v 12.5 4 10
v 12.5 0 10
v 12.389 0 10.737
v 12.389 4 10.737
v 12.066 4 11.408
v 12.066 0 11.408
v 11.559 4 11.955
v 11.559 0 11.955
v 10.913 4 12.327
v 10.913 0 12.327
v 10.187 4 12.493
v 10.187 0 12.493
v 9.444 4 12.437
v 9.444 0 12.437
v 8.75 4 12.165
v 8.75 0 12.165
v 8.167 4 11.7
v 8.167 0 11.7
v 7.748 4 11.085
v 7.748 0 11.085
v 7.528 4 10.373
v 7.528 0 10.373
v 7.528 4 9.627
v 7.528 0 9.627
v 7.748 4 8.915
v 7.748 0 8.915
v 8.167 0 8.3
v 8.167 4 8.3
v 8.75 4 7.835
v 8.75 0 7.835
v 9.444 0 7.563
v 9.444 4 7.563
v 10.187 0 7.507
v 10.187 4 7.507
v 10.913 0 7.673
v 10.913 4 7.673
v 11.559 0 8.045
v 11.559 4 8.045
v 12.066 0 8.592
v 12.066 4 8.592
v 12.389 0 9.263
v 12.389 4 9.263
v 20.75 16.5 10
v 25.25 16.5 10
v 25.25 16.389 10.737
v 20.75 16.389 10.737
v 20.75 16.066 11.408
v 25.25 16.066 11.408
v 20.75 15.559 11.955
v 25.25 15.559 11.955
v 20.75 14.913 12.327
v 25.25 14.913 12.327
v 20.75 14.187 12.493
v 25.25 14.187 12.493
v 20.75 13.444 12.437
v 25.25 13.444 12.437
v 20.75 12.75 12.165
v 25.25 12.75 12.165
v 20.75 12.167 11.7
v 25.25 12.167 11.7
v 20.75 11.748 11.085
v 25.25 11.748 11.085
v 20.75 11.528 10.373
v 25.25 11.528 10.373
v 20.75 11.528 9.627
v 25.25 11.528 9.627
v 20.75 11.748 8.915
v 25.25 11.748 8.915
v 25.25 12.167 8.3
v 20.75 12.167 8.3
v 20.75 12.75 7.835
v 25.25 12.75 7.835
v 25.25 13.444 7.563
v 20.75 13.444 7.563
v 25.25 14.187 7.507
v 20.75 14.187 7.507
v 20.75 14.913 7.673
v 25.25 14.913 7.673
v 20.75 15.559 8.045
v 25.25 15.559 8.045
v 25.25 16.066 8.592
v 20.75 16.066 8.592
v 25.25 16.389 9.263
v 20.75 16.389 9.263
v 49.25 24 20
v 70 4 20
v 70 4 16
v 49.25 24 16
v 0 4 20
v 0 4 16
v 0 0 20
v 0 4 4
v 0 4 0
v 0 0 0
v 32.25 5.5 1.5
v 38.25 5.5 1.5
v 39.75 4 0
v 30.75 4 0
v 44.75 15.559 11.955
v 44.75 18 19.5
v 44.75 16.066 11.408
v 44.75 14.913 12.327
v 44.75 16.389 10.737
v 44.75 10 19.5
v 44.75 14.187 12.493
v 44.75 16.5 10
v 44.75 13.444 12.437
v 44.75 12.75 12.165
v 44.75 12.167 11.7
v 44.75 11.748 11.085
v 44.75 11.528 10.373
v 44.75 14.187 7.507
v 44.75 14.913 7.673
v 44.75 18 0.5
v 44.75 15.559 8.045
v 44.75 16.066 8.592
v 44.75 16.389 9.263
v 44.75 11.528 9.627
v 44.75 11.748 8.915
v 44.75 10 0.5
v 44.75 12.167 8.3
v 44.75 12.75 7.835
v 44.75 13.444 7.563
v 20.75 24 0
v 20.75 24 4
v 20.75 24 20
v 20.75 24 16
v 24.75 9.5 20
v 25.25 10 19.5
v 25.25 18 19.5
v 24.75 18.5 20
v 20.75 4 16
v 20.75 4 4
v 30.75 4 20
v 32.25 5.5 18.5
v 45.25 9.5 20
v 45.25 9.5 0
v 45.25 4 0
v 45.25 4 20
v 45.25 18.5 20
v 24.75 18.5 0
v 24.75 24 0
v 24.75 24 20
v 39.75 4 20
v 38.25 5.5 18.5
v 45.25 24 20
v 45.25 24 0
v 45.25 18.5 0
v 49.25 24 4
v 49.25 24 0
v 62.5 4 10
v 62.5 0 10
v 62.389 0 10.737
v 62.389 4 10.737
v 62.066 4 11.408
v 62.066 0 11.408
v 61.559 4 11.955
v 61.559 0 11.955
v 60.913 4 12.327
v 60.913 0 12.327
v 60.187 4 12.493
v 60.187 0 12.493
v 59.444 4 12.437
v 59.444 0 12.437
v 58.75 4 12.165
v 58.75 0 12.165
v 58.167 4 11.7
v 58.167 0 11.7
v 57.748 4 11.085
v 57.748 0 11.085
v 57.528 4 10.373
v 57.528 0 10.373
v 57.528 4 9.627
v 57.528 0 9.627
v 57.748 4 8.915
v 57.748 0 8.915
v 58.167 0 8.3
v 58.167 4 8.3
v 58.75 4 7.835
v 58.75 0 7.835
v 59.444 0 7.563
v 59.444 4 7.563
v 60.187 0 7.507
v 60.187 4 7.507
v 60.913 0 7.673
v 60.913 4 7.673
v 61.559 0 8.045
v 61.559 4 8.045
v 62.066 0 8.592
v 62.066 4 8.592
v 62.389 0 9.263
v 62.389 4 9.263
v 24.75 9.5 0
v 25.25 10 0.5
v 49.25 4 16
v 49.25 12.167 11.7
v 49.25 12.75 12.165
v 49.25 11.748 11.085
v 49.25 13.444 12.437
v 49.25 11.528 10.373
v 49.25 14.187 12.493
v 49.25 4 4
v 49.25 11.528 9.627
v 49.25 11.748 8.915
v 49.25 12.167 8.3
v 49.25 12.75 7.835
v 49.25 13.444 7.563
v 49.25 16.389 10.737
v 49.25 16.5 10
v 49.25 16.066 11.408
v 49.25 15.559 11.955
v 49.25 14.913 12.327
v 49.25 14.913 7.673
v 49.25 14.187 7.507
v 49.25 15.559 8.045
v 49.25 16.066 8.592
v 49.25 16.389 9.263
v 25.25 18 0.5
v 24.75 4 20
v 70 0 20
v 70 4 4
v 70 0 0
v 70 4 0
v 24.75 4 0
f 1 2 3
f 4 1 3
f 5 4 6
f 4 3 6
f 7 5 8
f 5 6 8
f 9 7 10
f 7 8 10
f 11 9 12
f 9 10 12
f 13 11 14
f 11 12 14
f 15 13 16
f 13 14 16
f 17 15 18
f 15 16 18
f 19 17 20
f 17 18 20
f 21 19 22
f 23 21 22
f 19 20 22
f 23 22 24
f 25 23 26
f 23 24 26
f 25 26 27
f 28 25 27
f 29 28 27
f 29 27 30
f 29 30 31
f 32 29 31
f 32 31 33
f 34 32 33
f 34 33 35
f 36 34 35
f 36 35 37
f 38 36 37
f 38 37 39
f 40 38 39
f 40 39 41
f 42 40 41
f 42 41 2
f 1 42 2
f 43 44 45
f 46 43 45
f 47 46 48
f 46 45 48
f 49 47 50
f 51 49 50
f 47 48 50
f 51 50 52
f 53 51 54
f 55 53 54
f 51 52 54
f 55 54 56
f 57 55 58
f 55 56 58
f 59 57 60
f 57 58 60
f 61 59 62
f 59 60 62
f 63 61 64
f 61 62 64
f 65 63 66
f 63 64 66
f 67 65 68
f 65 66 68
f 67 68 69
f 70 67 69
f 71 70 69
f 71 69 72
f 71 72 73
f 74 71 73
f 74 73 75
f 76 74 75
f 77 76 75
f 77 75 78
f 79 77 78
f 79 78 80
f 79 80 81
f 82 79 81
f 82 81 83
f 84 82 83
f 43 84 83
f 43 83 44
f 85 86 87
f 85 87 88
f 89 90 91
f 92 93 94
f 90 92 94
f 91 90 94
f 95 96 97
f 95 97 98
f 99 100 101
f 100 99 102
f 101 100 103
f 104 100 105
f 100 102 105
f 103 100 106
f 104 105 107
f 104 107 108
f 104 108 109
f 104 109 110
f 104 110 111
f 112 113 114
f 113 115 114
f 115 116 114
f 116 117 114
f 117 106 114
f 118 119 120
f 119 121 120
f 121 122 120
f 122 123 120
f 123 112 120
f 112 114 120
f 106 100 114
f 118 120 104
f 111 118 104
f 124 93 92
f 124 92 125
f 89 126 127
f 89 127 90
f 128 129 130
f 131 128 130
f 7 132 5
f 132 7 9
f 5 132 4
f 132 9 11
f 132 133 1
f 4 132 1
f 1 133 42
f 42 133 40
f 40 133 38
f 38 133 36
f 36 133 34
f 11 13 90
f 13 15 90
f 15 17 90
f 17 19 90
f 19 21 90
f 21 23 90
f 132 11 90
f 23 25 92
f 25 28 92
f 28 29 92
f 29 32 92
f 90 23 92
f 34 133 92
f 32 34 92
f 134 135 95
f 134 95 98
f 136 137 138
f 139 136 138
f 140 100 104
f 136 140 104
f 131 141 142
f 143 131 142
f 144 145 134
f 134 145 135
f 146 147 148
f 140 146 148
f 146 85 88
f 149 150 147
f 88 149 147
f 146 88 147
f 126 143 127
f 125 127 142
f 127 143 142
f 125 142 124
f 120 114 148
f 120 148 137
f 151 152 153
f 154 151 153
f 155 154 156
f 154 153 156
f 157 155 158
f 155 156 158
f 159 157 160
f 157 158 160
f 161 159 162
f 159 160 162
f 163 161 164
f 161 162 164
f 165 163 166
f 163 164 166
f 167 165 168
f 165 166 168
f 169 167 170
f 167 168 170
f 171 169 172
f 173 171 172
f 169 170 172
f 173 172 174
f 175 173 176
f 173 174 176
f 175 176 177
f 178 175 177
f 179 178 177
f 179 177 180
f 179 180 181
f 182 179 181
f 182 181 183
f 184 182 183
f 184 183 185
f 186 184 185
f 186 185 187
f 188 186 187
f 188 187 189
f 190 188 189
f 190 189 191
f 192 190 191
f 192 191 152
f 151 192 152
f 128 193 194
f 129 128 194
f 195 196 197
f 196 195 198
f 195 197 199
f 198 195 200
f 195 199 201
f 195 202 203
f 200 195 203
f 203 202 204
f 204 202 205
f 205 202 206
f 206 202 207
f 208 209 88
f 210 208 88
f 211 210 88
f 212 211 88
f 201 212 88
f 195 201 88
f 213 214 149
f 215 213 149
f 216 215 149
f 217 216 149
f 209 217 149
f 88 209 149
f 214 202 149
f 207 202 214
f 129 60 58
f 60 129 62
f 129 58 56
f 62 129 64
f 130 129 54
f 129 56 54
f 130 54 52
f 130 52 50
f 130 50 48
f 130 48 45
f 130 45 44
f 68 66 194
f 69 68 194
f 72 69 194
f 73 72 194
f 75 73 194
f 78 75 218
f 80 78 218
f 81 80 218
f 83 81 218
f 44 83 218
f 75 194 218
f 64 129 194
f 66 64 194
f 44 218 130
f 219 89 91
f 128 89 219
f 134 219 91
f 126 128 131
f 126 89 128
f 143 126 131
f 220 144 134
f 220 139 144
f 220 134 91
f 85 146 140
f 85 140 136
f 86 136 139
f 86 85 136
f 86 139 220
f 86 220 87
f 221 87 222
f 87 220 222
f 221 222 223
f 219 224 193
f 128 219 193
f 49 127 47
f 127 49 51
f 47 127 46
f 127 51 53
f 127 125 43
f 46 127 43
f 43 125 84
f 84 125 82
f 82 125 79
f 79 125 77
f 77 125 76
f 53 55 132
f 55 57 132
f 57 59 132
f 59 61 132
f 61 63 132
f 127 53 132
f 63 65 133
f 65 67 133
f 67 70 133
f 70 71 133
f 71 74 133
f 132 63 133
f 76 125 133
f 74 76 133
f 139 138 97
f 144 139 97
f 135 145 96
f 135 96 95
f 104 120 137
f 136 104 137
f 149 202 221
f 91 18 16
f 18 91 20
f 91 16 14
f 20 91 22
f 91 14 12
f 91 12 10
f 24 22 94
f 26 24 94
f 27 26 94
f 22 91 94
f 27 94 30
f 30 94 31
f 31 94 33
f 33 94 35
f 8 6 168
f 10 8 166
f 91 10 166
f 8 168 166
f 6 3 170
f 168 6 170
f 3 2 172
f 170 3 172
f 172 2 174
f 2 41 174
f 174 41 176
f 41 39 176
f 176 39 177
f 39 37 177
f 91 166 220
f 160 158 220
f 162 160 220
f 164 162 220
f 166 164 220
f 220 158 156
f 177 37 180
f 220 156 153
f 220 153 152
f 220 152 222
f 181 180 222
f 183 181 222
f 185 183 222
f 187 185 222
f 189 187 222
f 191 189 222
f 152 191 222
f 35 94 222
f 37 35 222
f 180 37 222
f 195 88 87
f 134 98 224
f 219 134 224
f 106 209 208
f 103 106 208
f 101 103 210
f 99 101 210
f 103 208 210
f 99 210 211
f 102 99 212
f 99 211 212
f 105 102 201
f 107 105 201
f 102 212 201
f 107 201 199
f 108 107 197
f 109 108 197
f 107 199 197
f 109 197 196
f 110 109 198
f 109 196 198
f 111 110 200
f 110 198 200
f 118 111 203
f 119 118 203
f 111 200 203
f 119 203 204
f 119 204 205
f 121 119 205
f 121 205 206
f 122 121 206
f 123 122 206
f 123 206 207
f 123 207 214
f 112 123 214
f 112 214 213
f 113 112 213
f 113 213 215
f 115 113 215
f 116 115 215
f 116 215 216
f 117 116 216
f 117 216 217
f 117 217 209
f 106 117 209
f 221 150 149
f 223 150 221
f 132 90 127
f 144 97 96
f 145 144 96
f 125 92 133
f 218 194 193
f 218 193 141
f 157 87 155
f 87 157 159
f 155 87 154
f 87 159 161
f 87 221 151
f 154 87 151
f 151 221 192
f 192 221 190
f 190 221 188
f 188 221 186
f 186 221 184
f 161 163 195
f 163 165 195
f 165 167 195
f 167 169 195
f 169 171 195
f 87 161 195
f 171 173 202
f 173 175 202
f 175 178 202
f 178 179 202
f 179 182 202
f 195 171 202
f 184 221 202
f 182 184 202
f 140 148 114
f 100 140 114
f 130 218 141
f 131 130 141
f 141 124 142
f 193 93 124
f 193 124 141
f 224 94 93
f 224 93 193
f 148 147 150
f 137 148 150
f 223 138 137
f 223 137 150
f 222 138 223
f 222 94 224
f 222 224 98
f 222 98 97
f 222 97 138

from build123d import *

# Parameters (mm, degrees)
F1_DEPTH  = 20
F2_R      = 2.5
F3_DEPTH  = 24.001
F4_SIZE   = 0.5
F5_R      = 2.5
F6_DEPTH  = 28.5
F8_DEPTH  = 4
F10_DEPTH = 4
F11_SIZE  = 1.5


with BuildPart() as f1:
    # F0 (on Top) → F1 (new body)
    with BuildSketch(Plane.XY):
        Polygon((0, 4), (0, 0), (70, 0), (70, 4), (49.25, 4), (49.25, 24), (45.25, 24), (45.25, 18.5), (44.75, 18), (44.75, 10), (45.25, 9.5), (45.25, 4), (39.75, 4), (38.25, 5.5), (32.25, 5.5), (30.75, 4), (24.75, 4), (24.75, 9.5), (25.25, 10), (25.25, 18), (24.75, 18.5), (24.75, 24), (20.75, 24), (20.75, 4), align=None)
    extrude(amount=F1_DEPTH)

    # F2 (on face) → F3 (cut, through all)
    with BuildSketch(Plane.XZ):
        with Locations((10, 10)):
            Circle(F2_R)
        with Locations((60, 10)):
            Circle(F2_R)
    extrude(amount=-F3_DEPTH, mode=Mode.SUBTRACT)

    # F4
    f4_edges = [f1.edges().sort_by_distance(p)[0] for p in [
        (25.25, 14, 20),
        (25.25, 14, 0),
        (44.75, 14, 20),
        (44.75, 14, 0),
    ]]
    chamfer(f4_edges, length=F4_SIZE)

    # F5 (on face) → F6 (cut, through all)
    with BuildSketch(Plane.YZ.offset(49.25)):
        with Locations((14, 10)):
            Circle(F5_R)
    extrude(amount=-F6_DEPTH, mode=Mode.SUBTRACT)

    # F7 (on face) → F8 (join)
    with BuildSketch(Plane.XY.offset(20)):
        Polygon((20.75, 4), (20.75, 24), (0, 4), align=None)
        Polygon((70, 4), (49.25, 24), (49.25, 4), align=None)
    extrude(amount=-F8_DEPTH)

    # F9 (on face) → F10 (join)
    with BuildSketch(Plane(origin=(0, 0, 0), x_dir=(1, 0, 0), z_dir=(0, 0, -1))):
        Polygon((0, -4), (20.75, -24), (20.75, -4), align=None)
        Polygon((49.25, -24), (70, -4), (49.25, -4), align=None)
    extrude(amount=-F10_DEPTH)

    # F11
    f11_edges = [f1.edges().sort_by_distance(p)[0] for p in [
        (35.25, 5.5, 20),
        (35.25, 5.5, 0),
    ]]
    chamfer(f11_edges, length=F11_SIZE)


solid = f1.part
